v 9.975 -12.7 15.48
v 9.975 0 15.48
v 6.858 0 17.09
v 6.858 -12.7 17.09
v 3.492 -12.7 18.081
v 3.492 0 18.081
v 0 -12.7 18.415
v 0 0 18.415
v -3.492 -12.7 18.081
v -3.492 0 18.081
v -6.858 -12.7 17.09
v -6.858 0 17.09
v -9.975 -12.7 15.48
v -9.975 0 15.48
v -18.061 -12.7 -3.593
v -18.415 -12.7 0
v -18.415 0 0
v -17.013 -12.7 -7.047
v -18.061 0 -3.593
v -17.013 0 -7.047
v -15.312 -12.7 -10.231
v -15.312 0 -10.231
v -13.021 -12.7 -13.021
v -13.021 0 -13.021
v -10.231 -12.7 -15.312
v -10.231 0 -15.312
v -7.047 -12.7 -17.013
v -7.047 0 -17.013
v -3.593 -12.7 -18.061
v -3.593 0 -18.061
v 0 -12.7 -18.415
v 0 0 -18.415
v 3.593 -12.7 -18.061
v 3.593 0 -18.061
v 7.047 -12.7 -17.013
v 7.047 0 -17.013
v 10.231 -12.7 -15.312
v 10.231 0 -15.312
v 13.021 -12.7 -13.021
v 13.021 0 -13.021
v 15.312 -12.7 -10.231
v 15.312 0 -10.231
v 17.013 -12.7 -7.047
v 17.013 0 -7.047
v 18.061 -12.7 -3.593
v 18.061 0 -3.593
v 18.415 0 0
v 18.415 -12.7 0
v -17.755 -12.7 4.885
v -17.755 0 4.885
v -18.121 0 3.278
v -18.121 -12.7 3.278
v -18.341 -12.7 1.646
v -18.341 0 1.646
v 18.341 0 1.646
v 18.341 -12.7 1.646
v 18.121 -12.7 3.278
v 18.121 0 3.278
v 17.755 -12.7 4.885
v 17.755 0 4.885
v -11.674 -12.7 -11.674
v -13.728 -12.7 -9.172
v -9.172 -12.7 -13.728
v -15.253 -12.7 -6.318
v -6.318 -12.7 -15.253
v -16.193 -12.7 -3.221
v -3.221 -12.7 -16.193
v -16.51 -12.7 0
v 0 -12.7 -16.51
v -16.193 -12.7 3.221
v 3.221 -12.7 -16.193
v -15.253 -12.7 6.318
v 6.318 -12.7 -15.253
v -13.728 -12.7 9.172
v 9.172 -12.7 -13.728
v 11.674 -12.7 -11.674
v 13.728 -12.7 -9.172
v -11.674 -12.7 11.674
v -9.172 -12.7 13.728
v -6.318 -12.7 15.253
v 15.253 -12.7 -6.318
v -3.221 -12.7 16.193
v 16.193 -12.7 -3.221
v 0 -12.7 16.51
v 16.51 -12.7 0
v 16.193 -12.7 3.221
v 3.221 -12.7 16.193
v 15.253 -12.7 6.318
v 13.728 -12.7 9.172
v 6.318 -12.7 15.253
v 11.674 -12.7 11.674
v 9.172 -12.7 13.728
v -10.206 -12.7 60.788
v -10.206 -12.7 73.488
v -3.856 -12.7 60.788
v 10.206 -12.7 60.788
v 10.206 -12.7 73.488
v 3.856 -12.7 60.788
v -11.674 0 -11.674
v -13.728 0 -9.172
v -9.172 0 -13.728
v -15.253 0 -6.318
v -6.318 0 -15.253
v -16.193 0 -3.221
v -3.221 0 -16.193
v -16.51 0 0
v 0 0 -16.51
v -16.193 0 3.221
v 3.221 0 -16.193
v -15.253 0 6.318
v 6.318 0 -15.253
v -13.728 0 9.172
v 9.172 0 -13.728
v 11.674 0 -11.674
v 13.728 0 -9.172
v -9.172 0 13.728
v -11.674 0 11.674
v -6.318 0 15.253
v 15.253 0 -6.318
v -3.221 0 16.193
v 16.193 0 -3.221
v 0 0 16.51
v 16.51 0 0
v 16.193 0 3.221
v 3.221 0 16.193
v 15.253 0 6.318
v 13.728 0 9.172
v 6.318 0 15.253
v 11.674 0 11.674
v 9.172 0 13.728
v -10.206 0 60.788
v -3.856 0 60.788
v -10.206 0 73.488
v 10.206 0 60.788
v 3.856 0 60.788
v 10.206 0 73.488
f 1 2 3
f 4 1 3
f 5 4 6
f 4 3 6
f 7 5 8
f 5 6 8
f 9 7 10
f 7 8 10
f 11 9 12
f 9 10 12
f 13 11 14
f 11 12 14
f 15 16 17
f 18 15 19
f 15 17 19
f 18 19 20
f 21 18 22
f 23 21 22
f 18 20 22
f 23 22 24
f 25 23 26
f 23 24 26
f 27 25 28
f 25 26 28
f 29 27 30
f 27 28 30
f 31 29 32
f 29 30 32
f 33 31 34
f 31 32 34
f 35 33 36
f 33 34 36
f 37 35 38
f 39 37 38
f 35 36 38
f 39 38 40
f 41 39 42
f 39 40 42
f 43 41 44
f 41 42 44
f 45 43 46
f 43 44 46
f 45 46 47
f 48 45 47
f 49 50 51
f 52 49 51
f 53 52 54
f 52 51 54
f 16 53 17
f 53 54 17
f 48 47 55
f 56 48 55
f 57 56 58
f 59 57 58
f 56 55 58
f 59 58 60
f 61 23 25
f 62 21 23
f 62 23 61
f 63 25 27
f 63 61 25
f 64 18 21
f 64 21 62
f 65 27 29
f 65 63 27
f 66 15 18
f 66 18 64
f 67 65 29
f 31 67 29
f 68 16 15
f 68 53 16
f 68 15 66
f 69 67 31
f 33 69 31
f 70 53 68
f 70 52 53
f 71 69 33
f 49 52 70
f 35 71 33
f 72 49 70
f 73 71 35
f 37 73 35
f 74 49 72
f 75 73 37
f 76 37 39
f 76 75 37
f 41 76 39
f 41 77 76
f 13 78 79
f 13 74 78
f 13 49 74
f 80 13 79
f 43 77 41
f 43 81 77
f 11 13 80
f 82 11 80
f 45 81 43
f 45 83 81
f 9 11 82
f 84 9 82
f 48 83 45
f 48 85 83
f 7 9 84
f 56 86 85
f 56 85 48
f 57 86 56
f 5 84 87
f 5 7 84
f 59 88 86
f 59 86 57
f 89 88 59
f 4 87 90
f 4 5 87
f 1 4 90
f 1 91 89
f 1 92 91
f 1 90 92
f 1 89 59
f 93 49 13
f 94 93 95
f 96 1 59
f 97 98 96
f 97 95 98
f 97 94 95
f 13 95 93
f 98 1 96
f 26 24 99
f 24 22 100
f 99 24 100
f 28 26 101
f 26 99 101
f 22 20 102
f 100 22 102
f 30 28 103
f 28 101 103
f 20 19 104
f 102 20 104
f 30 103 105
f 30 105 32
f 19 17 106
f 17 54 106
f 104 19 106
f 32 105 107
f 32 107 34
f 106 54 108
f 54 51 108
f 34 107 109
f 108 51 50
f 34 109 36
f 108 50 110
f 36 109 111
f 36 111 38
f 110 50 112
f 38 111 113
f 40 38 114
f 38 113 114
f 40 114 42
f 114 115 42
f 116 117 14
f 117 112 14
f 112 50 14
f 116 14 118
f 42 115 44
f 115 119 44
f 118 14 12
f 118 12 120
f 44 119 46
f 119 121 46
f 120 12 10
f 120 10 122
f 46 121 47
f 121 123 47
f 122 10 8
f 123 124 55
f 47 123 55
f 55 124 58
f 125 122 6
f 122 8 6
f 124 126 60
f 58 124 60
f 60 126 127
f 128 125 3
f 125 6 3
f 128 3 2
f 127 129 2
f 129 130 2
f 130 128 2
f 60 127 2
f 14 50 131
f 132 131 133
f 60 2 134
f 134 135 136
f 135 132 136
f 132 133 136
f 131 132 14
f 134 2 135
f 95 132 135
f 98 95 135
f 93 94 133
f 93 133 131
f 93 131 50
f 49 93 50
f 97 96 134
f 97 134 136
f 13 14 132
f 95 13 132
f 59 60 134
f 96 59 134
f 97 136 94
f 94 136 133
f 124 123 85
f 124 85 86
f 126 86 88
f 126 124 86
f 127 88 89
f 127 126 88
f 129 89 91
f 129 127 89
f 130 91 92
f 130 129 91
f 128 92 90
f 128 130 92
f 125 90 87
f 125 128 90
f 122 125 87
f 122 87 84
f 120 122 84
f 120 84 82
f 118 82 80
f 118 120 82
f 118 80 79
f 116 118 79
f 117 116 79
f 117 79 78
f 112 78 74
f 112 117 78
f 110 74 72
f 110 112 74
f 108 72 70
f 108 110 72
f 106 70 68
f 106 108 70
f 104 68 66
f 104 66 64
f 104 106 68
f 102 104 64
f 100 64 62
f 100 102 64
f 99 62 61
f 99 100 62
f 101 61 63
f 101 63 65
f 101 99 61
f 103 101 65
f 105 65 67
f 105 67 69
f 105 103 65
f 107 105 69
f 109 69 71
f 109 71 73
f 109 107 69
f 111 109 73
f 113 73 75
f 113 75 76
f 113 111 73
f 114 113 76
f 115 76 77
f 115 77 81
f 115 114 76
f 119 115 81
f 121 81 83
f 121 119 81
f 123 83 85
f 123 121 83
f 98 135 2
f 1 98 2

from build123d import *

# Parameters (mm, degrees)
F0_R     = 16.51
F1_DEPTH = 12.7


# Not quite as in the source:
# - a feature names something its author has since deleted; it is built from what else it names


with BuildPart() as f1:
    # F0 (on Front) → F1 (new body)
    with BuildSketch(Plane.XZ):
        with BuildLine():
            ThreePointArc((17.7553829843, 4.8845265973), (14.8425769227, 10.9000062062), (9.9745940638, 15.4796543328))
            ThreePointArc((9.9745940638, 15.4796543328), (0, 18.415), (-9.9745940638, 15.4796543328))
            ThreePointArc((-9.9745940638, 15.4796543328), (-14.8425769227, 10.9000062062), (-17.7553829843, 4.8845265973))
            Line((-17.7553829843, 4.8845265973), (-18.415, 0))
            ThreePointArc((-18.415, 0), (0, -18.415), (18.415, 0))
            Line((18.415, 0), (17.7553829843, 4.8845265973))
        make_face()
        Circle(F0_R, mode=Mode.SUBTRACT)
        with BuildLine():
            ThreePointArc((-17.7553829843, 4.8845265973), (-14.8425769227, 10.9000062062), (-9.9745940638, 15.4796543328))
            Line((-9.9745940638, 15.4796543328), (-3.8560049814, 60.7883871295))
            Line((-3.8560049814, 60.7883871295), (-10.2060049814, 60.7883871295))
            Line((-10.2060049814, 60.7883871295), (-17.7553829843, 4.8845265973))
        make_face()
        with BuildLine():
            Line((3.8560049814, 60.7883871295), (9.9745940638, 15.4796543328))
            ThreePointArc((9.9745940638, 15.4796543328), (14.8425769227, 10.9000062062), (17.7553829843, 4.8845265973))
            Line((17.7553829843, 4.8845265973), (10.2060049814, 60.7883871295))
            Line((10.2060049814, 60.7883871295), (3.8560049814, 60.7883871295))
        make_face()
        with BuildLine():
            ThreePointArc((18.415, 0), (18.2493507098, 2.4644317137), (17.7553829843, 4.8845265973))
            Line((17.7553829843, 4.8845265973), (18.415, 0))
        make_face()
        with BuildLine():
            Line((-18.415, 0), (-17.7553829843, 4.8845265973))
            ThreePointArc((-17.7553829843, 4.8845265973), (-18.2493507098, 2.4644317137), (-18.415, 0))
        make_face()
        Polygon((0, 60.7883871295), (3.8560049814, 60.7883871295), (10.2060049814, 60.7883871295), (10.2060049814, 73.4883871295), (-10.2060049814, 73.4883871295), (-10.2060049814, 60.7883871295), (-3.8560049814, 60.7883871295), align=None)
    extrude(amount=F1_DEPTH)


solid = f1.part
